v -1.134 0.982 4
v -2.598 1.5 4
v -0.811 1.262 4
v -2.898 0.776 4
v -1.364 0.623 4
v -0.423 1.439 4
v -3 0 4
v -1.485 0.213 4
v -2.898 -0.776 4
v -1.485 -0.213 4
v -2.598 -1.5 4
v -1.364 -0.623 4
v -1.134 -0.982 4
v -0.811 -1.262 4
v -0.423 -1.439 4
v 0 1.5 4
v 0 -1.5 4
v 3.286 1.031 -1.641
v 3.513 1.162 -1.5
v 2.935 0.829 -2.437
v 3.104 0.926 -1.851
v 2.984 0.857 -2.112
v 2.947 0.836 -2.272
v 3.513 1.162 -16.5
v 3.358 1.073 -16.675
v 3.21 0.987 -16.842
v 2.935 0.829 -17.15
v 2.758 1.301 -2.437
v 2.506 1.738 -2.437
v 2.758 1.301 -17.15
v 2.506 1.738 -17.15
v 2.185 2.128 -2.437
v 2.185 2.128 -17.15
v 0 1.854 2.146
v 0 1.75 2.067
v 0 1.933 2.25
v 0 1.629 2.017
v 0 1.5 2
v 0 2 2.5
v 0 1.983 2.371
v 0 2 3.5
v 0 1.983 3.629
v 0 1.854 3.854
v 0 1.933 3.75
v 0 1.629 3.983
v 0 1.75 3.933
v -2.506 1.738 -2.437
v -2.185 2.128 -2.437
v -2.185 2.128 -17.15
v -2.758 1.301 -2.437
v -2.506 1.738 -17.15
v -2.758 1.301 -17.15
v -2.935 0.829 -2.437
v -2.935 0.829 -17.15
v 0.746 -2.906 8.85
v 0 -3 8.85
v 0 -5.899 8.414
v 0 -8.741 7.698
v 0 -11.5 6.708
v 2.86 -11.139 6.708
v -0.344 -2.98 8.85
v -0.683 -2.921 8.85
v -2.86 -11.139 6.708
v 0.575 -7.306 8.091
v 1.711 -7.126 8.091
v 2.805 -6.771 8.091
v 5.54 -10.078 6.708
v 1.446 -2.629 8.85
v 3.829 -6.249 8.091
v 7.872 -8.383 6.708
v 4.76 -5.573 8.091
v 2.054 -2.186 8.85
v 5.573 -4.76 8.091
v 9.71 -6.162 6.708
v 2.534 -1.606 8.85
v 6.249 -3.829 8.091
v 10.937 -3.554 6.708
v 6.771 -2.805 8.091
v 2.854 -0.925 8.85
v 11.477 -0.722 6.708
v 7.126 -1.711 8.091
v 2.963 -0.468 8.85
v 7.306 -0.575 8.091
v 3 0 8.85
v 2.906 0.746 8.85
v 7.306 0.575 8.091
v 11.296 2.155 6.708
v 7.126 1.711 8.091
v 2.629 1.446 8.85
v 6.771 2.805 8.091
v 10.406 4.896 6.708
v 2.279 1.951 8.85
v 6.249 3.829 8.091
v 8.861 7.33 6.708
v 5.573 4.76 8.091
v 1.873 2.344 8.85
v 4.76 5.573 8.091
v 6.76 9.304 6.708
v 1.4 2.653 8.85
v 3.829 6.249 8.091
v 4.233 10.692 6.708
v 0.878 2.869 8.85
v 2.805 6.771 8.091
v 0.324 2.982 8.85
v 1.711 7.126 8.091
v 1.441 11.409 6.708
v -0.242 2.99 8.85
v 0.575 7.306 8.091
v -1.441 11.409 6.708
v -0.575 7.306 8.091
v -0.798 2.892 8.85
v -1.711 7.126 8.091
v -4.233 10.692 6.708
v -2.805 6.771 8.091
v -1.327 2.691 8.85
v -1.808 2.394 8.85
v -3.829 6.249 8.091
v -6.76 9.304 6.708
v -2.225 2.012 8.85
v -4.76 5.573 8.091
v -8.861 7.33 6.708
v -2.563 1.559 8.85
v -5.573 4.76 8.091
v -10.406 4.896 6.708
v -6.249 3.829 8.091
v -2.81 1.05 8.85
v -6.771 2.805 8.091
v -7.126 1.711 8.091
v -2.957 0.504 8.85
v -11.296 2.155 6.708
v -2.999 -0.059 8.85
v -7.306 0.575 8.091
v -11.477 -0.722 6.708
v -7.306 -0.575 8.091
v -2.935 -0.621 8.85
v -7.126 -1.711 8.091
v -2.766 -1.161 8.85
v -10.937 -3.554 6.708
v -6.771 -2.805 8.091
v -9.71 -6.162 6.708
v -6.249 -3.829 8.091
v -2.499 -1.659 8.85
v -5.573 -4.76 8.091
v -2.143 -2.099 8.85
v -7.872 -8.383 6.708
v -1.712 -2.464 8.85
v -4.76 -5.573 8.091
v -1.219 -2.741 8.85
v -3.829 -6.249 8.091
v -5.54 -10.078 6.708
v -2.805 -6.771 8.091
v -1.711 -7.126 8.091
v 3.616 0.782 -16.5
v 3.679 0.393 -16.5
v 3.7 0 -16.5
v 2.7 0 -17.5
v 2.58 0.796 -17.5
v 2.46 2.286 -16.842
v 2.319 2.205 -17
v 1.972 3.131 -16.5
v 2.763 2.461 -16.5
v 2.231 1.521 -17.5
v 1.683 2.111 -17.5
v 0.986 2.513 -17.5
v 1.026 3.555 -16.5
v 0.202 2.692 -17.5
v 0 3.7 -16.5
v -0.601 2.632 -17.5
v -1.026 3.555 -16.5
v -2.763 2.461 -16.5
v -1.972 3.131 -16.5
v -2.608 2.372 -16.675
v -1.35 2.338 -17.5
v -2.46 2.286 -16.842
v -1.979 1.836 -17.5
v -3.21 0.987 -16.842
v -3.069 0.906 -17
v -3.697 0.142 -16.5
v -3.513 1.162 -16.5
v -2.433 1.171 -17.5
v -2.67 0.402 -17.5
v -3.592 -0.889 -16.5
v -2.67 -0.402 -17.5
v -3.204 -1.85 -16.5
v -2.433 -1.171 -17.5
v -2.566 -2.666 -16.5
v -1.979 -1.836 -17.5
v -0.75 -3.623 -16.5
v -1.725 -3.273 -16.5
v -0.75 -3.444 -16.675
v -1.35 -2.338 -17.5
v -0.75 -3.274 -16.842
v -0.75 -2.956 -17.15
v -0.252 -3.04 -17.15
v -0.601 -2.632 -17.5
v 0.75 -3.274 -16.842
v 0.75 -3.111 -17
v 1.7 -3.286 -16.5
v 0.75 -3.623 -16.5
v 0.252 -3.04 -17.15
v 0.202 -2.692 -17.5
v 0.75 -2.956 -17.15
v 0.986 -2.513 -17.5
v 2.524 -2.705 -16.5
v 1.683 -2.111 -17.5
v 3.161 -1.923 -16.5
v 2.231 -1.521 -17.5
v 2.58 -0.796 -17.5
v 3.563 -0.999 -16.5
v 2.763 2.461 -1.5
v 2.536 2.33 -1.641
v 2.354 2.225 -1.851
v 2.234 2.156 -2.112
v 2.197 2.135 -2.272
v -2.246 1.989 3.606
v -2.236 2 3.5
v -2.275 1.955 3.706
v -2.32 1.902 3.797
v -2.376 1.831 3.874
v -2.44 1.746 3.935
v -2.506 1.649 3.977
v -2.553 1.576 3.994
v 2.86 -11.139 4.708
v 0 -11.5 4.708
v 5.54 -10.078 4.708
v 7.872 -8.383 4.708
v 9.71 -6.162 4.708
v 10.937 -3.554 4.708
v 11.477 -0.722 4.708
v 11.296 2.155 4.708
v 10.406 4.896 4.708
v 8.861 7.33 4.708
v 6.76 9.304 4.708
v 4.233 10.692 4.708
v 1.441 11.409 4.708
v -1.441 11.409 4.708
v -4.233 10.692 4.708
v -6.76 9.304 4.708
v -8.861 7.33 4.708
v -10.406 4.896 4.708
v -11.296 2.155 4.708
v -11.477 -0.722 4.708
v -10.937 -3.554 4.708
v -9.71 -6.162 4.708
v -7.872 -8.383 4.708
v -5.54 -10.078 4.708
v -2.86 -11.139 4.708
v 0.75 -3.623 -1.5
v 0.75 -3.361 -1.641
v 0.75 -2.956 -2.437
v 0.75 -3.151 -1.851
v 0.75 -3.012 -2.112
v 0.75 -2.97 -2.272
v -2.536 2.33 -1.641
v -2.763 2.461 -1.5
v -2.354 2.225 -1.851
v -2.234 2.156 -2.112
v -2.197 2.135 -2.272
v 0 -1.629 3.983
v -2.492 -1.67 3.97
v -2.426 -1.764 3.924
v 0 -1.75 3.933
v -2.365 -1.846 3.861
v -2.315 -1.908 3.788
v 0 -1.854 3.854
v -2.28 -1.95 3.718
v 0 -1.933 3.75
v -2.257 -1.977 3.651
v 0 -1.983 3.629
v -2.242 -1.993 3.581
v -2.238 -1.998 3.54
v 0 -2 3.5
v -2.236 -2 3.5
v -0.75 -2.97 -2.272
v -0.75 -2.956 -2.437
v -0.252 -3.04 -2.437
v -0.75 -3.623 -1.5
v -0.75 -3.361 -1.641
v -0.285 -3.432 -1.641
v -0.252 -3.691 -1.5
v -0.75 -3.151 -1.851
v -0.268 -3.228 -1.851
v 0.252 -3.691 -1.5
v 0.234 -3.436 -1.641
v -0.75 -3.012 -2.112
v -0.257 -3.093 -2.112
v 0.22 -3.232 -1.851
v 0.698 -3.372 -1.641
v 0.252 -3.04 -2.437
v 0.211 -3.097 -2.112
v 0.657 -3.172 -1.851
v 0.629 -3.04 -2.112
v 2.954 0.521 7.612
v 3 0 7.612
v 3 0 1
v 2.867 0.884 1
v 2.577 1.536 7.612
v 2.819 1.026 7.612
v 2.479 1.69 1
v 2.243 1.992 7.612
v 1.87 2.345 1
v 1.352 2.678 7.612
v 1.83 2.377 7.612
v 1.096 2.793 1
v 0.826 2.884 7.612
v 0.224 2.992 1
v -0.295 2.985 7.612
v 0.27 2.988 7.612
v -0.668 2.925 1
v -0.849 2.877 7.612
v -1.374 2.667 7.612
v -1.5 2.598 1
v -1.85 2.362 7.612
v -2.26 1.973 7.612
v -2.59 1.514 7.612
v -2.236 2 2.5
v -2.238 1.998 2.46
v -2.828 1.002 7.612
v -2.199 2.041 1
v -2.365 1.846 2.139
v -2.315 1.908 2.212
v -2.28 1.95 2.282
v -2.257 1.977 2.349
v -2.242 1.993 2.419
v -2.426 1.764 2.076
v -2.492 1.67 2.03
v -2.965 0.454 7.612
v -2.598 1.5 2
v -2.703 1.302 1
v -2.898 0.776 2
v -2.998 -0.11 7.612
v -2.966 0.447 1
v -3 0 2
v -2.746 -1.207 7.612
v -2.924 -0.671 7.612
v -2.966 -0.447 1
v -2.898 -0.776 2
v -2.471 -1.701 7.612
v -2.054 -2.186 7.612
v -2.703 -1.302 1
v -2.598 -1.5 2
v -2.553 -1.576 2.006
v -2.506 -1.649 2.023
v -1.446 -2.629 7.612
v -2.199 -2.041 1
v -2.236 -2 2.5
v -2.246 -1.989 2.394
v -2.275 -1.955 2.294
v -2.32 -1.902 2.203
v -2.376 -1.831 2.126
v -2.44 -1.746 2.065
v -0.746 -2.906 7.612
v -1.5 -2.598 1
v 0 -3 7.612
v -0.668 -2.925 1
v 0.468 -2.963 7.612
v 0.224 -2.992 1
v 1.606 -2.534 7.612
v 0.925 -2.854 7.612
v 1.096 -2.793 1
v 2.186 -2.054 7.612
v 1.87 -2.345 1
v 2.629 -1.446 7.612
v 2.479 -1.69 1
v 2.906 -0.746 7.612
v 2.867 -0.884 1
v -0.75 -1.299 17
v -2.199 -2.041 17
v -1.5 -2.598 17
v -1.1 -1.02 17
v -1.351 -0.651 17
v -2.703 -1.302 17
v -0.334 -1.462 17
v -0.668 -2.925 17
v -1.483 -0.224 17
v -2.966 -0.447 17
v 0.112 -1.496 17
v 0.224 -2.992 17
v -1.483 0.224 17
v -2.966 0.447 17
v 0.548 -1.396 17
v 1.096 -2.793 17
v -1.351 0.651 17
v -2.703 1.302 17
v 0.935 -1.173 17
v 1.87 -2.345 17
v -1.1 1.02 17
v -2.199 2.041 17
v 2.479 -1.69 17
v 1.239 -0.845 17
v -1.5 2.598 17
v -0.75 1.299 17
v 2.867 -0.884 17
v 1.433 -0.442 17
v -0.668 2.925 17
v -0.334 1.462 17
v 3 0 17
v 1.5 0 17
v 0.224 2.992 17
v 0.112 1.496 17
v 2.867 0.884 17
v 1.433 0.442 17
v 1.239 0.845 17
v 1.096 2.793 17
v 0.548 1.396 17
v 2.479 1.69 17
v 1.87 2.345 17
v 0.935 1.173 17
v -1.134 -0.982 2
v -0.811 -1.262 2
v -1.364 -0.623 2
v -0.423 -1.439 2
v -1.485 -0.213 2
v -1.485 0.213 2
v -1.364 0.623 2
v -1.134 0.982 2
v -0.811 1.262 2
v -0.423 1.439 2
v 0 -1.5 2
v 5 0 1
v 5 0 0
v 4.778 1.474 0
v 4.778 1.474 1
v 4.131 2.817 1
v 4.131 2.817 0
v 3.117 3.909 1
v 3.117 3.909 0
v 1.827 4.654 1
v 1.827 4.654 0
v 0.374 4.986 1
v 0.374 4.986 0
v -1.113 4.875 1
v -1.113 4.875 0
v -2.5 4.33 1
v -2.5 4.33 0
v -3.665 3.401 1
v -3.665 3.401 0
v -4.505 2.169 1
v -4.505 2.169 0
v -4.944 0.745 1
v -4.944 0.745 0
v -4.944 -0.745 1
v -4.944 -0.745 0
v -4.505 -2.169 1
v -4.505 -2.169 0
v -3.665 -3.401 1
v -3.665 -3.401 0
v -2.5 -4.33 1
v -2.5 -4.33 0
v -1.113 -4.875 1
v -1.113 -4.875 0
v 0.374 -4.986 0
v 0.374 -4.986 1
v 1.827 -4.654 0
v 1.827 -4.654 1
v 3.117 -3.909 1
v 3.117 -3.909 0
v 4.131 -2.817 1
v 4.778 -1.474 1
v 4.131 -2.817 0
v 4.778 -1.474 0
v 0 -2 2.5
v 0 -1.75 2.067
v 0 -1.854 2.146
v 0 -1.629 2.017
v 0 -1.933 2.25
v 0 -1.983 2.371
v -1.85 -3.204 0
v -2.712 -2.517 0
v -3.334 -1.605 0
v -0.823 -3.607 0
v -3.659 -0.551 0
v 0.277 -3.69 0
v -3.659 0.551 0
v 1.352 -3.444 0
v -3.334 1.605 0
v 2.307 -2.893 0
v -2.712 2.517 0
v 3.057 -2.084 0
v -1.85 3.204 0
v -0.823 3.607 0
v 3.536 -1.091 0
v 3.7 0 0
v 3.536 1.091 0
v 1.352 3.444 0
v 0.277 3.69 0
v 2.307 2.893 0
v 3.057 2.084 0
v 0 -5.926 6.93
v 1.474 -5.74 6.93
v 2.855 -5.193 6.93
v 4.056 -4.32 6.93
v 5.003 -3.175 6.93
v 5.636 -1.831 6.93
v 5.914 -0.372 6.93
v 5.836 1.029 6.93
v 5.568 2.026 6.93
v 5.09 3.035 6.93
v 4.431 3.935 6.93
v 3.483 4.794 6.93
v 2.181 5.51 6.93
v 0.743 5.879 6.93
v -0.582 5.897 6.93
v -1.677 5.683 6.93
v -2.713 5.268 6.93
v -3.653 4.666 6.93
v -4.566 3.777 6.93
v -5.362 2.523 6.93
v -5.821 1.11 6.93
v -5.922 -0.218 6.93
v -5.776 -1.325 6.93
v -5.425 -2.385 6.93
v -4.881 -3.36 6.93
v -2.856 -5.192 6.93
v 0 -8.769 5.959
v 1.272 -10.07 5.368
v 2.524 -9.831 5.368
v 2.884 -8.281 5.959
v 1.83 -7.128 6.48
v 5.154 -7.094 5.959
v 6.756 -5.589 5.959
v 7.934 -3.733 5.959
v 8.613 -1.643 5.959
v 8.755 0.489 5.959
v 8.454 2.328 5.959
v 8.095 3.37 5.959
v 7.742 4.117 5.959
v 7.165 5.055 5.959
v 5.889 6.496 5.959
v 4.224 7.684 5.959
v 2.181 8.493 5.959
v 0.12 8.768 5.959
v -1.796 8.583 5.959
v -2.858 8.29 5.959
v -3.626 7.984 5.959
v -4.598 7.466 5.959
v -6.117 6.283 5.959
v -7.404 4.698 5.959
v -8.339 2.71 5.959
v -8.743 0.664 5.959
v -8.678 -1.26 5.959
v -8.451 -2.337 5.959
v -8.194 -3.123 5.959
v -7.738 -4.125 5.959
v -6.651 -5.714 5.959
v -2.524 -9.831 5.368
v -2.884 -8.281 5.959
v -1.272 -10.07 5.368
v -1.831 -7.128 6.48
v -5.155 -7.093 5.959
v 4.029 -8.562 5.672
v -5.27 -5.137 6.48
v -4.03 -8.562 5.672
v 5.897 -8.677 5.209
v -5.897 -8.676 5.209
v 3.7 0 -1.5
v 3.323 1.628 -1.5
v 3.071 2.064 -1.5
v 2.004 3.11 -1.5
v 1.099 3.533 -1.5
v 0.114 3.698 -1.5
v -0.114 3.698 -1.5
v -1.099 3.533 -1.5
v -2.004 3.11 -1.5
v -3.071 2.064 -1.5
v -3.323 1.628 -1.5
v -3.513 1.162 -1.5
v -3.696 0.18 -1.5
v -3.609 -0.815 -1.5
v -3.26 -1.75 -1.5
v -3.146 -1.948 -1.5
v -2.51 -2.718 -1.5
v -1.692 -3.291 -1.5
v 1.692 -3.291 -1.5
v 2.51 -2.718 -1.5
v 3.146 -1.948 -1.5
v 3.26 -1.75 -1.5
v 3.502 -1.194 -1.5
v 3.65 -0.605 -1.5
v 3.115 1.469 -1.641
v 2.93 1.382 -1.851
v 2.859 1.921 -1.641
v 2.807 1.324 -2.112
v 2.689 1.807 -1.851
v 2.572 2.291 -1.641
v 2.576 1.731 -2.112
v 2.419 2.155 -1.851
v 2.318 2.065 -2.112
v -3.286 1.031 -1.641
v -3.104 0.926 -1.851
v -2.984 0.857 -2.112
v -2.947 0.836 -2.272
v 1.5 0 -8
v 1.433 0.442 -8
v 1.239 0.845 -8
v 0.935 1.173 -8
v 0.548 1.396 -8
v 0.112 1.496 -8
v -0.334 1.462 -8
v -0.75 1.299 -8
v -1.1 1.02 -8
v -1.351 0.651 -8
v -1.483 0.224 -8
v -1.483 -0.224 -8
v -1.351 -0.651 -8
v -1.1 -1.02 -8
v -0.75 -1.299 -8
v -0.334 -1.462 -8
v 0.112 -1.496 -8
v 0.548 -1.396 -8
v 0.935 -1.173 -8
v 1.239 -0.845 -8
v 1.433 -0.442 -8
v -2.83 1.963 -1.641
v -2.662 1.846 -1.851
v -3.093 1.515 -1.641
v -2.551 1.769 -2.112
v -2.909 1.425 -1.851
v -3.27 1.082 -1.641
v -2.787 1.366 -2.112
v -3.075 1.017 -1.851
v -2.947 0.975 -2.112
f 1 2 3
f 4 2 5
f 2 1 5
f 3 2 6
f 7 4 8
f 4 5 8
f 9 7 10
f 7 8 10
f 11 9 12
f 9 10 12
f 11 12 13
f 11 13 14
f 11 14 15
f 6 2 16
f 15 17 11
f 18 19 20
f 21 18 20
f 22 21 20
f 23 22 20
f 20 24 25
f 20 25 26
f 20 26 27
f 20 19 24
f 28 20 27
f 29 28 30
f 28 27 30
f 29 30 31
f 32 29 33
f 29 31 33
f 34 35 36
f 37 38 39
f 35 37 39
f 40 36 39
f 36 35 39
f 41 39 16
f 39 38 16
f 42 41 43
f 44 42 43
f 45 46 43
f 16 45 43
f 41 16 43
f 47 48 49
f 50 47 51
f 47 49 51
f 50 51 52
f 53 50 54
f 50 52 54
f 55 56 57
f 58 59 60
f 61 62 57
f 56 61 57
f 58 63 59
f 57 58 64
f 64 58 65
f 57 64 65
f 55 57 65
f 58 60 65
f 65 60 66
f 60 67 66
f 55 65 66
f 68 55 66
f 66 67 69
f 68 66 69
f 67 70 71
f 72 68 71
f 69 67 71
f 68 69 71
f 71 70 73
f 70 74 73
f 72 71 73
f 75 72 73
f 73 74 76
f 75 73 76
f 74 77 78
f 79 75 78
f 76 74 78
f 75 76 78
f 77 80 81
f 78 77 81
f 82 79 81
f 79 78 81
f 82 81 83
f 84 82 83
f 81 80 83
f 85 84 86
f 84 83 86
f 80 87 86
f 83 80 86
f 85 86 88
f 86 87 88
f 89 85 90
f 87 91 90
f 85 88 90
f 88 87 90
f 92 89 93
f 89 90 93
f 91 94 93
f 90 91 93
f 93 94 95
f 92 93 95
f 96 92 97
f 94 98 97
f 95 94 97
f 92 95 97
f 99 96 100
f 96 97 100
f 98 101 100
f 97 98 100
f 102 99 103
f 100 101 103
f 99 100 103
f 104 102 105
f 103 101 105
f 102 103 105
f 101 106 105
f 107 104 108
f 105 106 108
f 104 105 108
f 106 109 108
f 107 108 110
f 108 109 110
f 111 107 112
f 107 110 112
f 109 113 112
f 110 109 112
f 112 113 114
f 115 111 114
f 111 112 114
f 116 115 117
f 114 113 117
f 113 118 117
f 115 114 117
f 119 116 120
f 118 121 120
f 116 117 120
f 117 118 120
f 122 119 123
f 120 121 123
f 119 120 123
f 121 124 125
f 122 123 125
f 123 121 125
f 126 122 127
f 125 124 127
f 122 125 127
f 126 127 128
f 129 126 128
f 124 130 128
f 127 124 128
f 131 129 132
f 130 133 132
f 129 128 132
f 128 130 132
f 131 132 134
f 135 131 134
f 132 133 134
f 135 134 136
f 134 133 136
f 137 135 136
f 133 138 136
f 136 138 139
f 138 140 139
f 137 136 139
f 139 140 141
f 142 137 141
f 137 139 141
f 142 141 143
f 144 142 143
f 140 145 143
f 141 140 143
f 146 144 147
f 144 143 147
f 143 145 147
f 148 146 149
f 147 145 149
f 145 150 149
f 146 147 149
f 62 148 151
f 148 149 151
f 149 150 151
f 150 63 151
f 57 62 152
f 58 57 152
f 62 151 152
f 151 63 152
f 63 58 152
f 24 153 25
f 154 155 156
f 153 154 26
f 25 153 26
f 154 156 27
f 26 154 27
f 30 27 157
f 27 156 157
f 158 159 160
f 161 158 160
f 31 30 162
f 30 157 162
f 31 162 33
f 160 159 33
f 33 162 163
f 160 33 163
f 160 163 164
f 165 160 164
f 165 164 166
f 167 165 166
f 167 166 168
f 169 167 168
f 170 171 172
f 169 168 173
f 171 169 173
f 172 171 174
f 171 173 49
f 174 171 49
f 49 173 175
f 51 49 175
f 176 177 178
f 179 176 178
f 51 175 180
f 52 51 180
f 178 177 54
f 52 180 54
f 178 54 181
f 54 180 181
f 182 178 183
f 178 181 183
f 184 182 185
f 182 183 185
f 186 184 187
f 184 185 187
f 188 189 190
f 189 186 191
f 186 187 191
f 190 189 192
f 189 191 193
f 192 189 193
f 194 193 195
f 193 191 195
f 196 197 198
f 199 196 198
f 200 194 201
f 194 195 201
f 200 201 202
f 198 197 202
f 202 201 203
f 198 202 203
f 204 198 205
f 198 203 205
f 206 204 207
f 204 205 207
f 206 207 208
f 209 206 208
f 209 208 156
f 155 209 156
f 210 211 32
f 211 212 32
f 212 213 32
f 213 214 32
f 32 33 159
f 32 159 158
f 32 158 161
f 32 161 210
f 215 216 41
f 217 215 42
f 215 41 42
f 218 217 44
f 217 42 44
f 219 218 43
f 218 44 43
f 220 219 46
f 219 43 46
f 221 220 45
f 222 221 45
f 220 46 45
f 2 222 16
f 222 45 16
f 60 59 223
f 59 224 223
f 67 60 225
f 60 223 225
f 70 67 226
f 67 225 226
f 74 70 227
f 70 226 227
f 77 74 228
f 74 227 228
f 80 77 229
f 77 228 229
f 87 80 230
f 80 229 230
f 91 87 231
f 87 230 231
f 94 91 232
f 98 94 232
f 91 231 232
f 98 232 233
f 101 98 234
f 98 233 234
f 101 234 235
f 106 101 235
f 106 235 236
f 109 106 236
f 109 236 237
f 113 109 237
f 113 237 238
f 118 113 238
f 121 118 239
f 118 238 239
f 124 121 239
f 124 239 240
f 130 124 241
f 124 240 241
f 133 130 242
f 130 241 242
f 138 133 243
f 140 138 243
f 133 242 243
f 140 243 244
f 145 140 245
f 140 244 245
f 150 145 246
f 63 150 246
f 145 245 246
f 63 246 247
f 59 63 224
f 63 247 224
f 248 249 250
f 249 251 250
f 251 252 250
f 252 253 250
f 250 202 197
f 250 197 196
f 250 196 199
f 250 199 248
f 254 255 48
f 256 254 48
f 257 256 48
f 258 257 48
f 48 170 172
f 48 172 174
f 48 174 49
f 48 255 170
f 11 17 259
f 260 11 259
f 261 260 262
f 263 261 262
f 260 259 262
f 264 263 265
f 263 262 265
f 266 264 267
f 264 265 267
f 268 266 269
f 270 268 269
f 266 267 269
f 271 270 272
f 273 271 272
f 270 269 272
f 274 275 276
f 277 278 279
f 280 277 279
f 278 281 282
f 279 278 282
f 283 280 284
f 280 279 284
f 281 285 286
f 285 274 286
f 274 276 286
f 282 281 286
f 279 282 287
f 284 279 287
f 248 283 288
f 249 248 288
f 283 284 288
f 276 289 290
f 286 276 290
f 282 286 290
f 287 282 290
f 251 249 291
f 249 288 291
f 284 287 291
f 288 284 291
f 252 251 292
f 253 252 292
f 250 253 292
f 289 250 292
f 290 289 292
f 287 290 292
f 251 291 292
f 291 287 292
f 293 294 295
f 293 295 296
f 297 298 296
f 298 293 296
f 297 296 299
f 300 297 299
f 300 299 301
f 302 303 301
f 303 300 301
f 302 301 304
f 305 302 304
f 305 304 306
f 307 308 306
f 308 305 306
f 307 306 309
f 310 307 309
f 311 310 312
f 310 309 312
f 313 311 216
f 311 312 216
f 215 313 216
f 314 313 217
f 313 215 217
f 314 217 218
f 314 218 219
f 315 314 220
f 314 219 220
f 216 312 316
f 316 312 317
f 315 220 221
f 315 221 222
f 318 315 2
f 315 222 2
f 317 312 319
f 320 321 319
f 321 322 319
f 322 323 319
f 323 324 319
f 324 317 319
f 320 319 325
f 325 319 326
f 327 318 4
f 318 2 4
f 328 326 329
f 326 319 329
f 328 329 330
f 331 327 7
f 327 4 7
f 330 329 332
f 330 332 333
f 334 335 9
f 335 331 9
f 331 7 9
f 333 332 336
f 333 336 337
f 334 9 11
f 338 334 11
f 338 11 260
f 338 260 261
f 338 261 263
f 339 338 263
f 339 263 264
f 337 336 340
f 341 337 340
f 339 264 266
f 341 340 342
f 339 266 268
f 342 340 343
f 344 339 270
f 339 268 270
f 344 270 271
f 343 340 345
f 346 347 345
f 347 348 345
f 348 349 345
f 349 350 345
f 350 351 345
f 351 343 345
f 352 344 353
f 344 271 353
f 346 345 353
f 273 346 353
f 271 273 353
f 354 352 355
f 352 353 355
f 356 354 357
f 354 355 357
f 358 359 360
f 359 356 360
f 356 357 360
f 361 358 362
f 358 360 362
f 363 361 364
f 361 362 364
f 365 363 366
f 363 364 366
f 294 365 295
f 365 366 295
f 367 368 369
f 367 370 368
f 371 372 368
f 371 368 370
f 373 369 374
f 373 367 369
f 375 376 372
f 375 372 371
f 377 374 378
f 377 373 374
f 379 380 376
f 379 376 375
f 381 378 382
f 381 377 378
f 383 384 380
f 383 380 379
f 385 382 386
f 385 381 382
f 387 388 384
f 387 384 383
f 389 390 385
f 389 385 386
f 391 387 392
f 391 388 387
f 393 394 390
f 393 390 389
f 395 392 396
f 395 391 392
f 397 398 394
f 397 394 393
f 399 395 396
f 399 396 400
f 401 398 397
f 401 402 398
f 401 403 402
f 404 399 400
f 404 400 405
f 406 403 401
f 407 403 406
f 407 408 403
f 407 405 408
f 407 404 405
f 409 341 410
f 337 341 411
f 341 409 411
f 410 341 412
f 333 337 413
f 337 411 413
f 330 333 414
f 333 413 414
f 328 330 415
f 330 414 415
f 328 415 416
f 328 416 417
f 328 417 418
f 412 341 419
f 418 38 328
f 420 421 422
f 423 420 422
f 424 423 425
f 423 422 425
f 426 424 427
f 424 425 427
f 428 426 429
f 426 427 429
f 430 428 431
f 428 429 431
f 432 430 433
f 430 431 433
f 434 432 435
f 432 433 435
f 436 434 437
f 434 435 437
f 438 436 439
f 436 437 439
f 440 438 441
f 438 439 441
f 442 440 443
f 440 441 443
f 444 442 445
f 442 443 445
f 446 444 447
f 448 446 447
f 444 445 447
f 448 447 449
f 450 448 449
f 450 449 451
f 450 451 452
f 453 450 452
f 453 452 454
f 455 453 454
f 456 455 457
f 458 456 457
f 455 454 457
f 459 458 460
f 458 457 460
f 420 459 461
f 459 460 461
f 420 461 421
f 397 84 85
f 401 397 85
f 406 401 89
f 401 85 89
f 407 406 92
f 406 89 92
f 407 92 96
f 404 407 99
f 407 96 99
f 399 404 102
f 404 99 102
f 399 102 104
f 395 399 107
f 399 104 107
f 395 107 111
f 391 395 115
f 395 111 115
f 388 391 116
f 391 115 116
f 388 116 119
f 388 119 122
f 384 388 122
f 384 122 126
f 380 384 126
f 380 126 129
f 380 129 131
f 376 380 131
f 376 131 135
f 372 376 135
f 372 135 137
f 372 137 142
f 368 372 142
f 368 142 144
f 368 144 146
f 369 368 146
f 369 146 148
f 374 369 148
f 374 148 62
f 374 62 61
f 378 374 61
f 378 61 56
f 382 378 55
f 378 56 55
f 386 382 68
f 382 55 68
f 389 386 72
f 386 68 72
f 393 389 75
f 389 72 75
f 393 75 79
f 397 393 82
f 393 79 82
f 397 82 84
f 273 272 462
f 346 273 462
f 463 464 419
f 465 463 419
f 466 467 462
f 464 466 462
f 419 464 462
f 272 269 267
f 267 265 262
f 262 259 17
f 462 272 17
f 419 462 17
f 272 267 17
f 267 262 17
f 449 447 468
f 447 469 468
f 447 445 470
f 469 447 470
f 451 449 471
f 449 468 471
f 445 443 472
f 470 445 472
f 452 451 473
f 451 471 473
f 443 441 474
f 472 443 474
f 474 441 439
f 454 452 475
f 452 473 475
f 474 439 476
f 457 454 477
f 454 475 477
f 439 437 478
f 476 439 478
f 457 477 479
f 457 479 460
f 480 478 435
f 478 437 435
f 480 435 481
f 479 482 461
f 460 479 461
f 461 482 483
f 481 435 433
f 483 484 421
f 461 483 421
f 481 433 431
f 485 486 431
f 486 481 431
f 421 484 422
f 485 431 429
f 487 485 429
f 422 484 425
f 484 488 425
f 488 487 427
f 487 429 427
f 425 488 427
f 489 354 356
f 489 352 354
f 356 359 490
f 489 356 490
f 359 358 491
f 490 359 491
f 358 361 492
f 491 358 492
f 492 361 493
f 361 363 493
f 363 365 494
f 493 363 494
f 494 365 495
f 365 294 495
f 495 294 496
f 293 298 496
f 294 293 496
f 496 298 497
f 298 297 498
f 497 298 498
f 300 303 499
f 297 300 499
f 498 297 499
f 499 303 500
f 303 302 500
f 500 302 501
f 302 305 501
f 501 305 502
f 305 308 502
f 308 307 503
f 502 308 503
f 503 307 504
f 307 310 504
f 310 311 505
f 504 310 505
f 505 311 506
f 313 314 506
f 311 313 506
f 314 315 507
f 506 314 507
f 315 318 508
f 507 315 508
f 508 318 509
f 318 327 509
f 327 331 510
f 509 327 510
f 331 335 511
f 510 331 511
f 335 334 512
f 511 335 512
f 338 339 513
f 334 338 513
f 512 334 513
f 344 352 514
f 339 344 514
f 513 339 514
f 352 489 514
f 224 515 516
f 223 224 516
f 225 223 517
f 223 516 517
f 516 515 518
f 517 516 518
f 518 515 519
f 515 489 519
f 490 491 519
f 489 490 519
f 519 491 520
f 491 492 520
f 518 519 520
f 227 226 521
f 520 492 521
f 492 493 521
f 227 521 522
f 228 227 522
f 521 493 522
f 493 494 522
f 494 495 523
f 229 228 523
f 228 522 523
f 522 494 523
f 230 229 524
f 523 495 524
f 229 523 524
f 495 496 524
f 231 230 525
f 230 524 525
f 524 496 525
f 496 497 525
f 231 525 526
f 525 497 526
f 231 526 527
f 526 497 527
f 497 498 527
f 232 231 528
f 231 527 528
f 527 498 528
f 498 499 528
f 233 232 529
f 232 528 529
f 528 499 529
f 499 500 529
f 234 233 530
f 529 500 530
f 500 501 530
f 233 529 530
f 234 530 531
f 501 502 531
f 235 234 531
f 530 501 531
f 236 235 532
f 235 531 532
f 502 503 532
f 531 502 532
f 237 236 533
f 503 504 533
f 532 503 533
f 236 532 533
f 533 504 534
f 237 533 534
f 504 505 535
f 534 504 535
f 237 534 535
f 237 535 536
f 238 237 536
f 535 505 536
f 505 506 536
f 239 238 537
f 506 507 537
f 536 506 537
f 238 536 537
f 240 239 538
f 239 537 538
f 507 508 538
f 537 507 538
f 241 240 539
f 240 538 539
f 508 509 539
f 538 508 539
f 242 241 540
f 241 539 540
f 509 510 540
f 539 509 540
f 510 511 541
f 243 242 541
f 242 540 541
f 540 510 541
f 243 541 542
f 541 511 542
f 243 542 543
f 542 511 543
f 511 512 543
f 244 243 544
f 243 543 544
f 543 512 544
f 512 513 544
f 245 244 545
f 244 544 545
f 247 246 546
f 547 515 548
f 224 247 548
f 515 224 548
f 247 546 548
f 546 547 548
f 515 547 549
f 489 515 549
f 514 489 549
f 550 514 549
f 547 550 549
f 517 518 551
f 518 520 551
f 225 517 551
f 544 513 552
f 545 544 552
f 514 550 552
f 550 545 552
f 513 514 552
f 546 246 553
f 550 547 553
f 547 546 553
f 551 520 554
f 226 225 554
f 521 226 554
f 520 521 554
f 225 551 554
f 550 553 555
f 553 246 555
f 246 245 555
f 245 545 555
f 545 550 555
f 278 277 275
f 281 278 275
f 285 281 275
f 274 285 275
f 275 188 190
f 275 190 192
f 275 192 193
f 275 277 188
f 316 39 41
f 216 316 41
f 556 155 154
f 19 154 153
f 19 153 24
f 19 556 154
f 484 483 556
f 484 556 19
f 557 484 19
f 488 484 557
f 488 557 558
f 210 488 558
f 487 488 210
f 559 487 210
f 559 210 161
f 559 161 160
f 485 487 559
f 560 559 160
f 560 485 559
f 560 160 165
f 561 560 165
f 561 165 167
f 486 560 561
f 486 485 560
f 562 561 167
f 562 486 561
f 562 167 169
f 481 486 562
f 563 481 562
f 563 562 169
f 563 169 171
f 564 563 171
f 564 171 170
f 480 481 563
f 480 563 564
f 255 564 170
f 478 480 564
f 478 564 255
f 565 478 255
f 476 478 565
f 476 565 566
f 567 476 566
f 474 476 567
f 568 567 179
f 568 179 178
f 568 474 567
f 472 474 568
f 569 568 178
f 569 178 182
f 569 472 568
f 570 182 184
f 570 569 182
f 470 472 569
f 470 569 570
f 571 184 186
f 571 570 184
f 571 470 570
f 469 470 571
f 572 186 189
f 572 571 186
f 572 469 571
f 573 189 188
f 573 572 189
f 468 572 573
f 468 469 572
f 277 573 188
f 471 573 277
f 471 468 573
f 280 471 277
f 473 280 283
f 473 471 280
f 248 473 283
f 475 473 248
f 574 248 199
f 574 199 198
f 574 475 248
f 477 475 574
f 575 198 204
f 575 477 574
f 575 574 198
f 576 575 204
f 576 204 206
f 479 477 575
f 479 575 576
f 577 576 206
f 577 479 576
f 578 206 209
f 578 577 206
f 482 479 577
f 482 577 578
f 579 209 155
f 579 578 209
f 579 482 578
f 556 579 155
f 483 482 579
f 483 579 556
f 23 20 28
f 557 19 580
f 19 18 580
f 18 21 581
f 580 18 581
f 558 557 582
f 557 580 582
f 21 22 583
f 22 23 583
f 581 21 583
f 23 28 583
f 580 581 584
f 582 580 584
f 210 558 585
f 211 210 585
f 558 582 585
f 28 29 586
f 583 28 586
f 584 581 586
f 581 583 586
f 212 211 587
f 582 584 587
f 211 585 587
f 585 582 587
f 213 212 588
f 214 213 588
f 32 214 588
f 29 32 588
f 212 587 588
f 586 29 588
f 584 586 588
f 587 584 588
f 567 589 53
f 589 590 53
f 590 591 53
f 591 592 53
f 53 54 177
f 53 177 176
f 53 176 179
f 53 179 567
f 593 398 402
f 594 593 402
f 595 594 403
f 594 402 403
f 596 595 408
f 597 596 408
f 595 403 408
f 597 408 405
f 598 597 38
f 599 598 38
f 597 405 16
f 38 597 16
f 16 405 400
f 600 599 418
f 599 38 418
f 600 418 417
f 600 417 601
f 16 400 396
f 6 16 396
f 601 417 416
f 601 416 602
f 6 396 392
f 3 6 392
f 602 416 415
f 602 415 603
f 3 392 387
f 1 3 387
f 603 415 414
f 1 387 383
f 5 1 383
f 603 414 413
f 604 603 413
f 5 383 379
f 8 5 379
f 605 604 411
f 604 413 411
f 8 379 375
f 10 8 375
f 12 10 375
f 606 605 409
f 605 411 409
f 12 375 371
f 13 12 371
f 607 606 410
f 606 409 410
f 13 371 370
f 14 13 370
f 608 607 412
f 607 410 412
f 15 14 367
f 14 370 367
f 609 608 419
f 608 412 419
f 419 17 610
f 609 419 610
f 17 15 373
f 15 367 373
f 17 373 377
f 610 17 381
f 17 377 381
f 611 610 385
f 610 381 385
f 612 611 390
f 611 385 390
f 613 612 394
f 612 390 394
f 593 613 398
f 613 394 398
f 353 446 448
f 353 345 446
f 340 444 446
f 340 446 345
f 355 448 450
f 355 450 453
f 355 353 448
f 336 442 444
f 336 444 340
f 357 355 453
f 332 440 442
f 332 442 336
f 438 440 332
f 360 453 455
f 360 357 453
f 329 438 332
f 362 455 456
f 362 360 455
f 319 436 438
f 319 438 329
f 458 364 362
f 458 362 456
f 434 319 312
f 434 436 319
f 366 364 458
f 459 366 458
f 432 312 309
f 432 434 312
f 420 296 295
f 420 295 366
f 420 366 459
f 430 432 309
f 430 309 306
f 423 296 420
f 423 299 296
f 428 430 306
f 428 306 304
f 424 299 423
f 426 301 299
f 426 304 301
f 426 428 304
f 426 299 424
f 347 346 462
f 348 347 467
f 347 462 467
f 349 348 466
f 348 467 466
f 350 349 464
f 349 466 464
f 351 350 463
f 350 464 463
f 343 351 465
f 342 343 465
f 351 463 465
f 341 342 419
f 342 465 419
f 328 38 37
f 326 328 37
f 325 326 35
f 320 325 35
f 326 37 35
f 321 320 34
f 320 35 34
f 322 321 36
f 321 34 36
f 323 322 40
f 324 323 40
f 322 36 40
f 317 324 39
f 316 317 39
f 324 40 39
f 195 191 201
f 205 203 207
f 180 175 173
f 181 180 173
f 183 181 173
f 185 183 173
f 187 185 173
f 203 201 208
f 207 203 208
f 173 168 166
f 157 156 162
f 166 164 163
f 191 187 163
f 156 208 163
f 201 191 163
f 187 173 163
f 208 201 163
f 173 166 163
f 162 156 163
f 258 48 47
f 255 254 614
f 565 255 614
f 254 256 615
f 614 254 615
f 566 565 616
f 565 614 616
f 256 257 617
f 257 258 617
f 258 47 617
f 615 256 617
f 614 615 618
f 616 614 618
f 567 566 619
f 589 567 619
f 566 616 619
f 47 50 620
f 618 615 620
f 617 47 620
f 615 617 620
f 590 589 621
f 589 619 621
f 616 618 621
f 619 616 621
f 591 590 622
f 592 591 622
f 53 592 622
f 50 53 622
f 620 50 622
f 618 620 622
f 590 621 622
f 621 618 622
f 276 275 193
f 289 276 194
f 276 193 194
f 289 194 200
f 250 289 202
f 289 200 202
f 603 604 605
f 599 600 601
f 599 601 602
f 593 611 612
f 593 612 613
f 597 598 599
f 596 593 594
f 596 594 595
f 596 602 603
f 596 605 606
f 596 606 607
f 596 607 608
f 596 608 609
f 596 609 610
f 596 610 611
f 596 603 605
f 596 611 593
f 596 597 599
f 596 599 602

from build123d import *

# Parameters (mm, degrees)
F0_R        = 3.7
F1_DEPTH    = 17.5
F3_DEPTH    = 16
F4_T2_ANGLE = 116.4603484981
F4_T4_ANGLE = 116.4603484981
F4_T6_ANGLE = 116.4603484981
F5_T2_ANGLE = 176.2935685117
F5_T4_ANGLE = 176.2935685117
F5_T6_ANGLE = 58.1290115734
F5_T8_ANGLE = 118.1404591149
F6_R        = 5
F7_DEPTH    = 1
F8_R        = 3
F9_DEPTH    = 16
F14_DEPTH   = 25
F15_R       = 1.5
F16_DEPTH   = 25


# Not quite as in the source:
# - a fillet or chamfer that OpenCascade refuses, or shapes differently, is made with other operations: its cross-section is extruded or revolved along the edge and cut away or added


with BuildPart() as f1:
    # F0 (on Top) → F1 (new body)
    with BuildSketch(Plane.XY):
        Circle(F0_R)
    extrude(amount=-F1_DEPTH)

    # F2 (on face) → F3 (cut)
    with BuildSketch(Plane(origin=(0, 0, -17.5), x_dir=(1, 0, 0), z_dir=(0, 0, -1))):
        with BuildLine():
            ThreePointArc((-2.1852734229, -2.1276936027), (-2.6413774815, -1.525), (-2.9352734229, -0.8286554971))
            Line((-2.9352734229, -0.8286554971), (-3.5127738924, -1.1620755486))
            ThreePointArc((-3.5127738924, -1.1620755486), (-3.204293994, -1.85), (-2.7627738924, -2.4611136543))
            Line((-2.7627738924, -2.4611136543), (-2.1852734229, -2.1276936027))
        make_face()
        with BuildLine():
            Line((-0.75, 3.6231892029), (-0.75, 2.9563490998))
            ThreePointArc((-0.75, 2.9563490998), (0, 3.05), (0.75, 2.9563490998))
            Line((0.75, 2.9563490998), (0.75, 3.6231892029))
            ThreePointArc((0.75, 3.6231892029), (0, 3.7), (-0.75, 3.6231892029))
        make_face()
        with BuildLine():
            Line((2.1852734229, -2.1276936027), (2.7627738924, -2.4611136543))
            ThreePointArc((2.7627738924, -2.4611136543), (3.204293994, -1.85), (3.5127738924, -1.1620755486))
            Line((3.5127738924, -1.1620755486), (2.9352734229, -0.8286554971))
            ThreePointArc((2.9352734229, -0.8286554971), (2.6413774815, -1.525), (2.1852734229, -2.1276936027))
        make_face()
    extrude(amount=-F3_DEPTH, mode=Mode.SUBTRACT)

    # F4: fillet of radius 1 on 3 edges, made by hand

    # F4_s1 → F4_t2 (revolve)
    with BuildSketch(Plane(origin=(0, 0, 0), x_dir=(0, 0, 1), z_dir=(-0.473014829, -0.8810544657, 0))):
        with BuildLine():
            ThreePointArc((-1.5, -3.7), (-1.8666619872, -3.2284161637), (-2.4367496998, -3.05))
            Line((-2.4367496998, -3.05), (-1.5, -3.05))
            Line((-1.5, -3.05), (-1.5, -3.7))
        make_face()
    revolve(axis=Axis((0, 0, -1.5), (0, 0, 1)), revolution_arc=F4_T2_ANGLE)

    # F4_s3 → F4_t4 (revolve)
    with BuildSketch(Plane(origin=(0, 0, 0), x_dir=(0, 0, 1), z_dir=(-0.526508135, 0.8501700911, 0))):
        with BuildLine():
            ThreePointArc((-1.5, -3.7), (-1.8666619872, -3.2284161637), (-2.4367496998, -3.05))
            Line((-2.4367496998, -3.05), (-1.5, -3.05))
            Line((-1.5, -3.05), (-1.5, -3.7))
        make_face()
    revolve(axis=Axis((0, 0, -1.5), (0, 0, 1)), revolution_arc=F4_T4_ANGLE)

    # F4_s5 → F4_t6 (revolve)
    with BuildSketch(Plane(origin=(0, 0, 0), x_dir=(0, 0, 1), z_dir=(0.9995229639, 0.0308843746, 0))):
        with BuildLine():
            ThreePointArc((-1.5, -3.7), (-1.8666619872, -3.2284161637), (-2.4367496998, -3.05))
            Line((-2.4367496998, -3.05), (-1.5, -3.05))
            Line((-1.5, -3.05), (-1.5, -3.7))
        make_face()
    revolve(axis=Axis((0, 0, -1.5), (0, 0, 1)), revolution_arc=F4_T6_ANGLE)

    # F5: chamfer of 1 on 4 edges, made by hand

    # F5_s1 → F5_t2 (revolve, cut)
    with BuildSketch(Plane(origin=(0, 0, 0), x_dir=(0, 0, 1), z_dir=(0.8494028952, 0.5277449399, 0))):
        Polygon((-16.5, -3.7), (-17.5, -2.7), (-17.5, -3.7), align=None)
    revolve(axis=Axis((0, 0, -17.5), (0, 0, 1)), revolution_arc=F5_T2_ANGLE, mode=Mode.SUBTRACT)

    # F5_s3 → F5_t4 (revolve, cut)
    with BuildSketch(Plane(origin=(0, 0, 0), x_dir=(0, 0, 1), z_dir=(0.032339077, -0.9994769553, 0))):
        Polygon((-16.5, -3.7), (-17.5, -2.7), (-17.5, -3.7), align=None)
    revolve(axis=Axis((0, 0, -17.5), (0, 0, 1)), revolution_arc=F5_T4_ANGLE, mode=Mode.SUBTRACT)

    # F5_s5 → F5_t6 (revolve, cut)
    with BuildSketch(Plane.XZ):
        Polygon((3.7, -16.5), (2.7, -17.5), (3.7, -17.5), align=None)
    revolve(axis=Axis((0, 0, -17.5), (0, 0, 1)), revolution_arc=F5_T6_ANGLE, mode=Mode.SUBTRACT)

    # F5_s7 → F5_t8 (revolve, cut)
    with BuildSketch(Plane(origin=(0, 0, 0), x_dir=(0, 0, 1), z_dir=(-0.8817940435, 0.471634673, 0))):
        Polygon((-16.5, -3.7), (-17.5, -2.7), (-17.5, -3.7), align=None)
    revolve(axis=Axis((0, 0, -17.5), (0, 0, 1)), revolution_arc=F5_T8_ANGLE, mode=Mode.SUBTRACT)

    # F6 (on face) → F7 (join)
    with BuildSketch(Plane.XY):
        Circle(F6_R)
    extrude(amount=F7_DEPTH)

    # F8 (on face) → F9 (join)
    with BuildSketch(Plane.XY.offset(1)):
        Circle(F8_R)
    extrude(amount=F9_DEPTH)

    # F10 (on Right) → F12 (revolve)
    with BuildSketch(Plane.YZ):
        with BuildLine():
            Line((0, 8), (0, 9))
            ThreePointArc((0, 9), (-5.863059775, 8.4214977538), (-11.5, 6.708302005))
            Line((-11.5, 6.708302005), (-11.5, 4.708302005))
            ThreePointArc((-11.5, 4.708302005), (-5.9157247408, 6.9331331941), (0, 8))
        make_face()
    revolve(axis=Axis((0, 0, 8.2032438368), (0, 0, 1)))

    # F13 (on Right) → F14 (cut)
    with BuildSketch(Plane.YZ):
        with BuildLine():
            ThreePointArc((2, 3.5), (1.8535533906, 3.8535533906), (1.5, 4))
            Line((1.5, 4), (-1.5, 4))
            ThreePointArc((-1.5, 4), (-1.8535533906, 3.8535533906), (-2, 3.5))
            Line((-2, 3.5), (-2, 2.5))
            ThreePointArc((-2, 2.5), (-1.8535533906, 2.1464466094), (-1.5, 2))
            Line((-1.5, 2), (1.5, 2))
            ThreePointArc((1.5, 2), (1.8535533906, 2.1464466094), (2, 2.5))
            Line((2, 2.5), (2, 3.5))
        make_face()
    extrude(amount=-F14_DEPTH, mode=Mode.SUBTRACT)

    # F15 (on face) → F16 (cut)
    with BuildSketch(Plane.XY.offset(17)):
        Circle(F15_R)
    extrude(amount=-F16_DEPTH, mode=Mode.SUBTRACT)


solid = f1.part
